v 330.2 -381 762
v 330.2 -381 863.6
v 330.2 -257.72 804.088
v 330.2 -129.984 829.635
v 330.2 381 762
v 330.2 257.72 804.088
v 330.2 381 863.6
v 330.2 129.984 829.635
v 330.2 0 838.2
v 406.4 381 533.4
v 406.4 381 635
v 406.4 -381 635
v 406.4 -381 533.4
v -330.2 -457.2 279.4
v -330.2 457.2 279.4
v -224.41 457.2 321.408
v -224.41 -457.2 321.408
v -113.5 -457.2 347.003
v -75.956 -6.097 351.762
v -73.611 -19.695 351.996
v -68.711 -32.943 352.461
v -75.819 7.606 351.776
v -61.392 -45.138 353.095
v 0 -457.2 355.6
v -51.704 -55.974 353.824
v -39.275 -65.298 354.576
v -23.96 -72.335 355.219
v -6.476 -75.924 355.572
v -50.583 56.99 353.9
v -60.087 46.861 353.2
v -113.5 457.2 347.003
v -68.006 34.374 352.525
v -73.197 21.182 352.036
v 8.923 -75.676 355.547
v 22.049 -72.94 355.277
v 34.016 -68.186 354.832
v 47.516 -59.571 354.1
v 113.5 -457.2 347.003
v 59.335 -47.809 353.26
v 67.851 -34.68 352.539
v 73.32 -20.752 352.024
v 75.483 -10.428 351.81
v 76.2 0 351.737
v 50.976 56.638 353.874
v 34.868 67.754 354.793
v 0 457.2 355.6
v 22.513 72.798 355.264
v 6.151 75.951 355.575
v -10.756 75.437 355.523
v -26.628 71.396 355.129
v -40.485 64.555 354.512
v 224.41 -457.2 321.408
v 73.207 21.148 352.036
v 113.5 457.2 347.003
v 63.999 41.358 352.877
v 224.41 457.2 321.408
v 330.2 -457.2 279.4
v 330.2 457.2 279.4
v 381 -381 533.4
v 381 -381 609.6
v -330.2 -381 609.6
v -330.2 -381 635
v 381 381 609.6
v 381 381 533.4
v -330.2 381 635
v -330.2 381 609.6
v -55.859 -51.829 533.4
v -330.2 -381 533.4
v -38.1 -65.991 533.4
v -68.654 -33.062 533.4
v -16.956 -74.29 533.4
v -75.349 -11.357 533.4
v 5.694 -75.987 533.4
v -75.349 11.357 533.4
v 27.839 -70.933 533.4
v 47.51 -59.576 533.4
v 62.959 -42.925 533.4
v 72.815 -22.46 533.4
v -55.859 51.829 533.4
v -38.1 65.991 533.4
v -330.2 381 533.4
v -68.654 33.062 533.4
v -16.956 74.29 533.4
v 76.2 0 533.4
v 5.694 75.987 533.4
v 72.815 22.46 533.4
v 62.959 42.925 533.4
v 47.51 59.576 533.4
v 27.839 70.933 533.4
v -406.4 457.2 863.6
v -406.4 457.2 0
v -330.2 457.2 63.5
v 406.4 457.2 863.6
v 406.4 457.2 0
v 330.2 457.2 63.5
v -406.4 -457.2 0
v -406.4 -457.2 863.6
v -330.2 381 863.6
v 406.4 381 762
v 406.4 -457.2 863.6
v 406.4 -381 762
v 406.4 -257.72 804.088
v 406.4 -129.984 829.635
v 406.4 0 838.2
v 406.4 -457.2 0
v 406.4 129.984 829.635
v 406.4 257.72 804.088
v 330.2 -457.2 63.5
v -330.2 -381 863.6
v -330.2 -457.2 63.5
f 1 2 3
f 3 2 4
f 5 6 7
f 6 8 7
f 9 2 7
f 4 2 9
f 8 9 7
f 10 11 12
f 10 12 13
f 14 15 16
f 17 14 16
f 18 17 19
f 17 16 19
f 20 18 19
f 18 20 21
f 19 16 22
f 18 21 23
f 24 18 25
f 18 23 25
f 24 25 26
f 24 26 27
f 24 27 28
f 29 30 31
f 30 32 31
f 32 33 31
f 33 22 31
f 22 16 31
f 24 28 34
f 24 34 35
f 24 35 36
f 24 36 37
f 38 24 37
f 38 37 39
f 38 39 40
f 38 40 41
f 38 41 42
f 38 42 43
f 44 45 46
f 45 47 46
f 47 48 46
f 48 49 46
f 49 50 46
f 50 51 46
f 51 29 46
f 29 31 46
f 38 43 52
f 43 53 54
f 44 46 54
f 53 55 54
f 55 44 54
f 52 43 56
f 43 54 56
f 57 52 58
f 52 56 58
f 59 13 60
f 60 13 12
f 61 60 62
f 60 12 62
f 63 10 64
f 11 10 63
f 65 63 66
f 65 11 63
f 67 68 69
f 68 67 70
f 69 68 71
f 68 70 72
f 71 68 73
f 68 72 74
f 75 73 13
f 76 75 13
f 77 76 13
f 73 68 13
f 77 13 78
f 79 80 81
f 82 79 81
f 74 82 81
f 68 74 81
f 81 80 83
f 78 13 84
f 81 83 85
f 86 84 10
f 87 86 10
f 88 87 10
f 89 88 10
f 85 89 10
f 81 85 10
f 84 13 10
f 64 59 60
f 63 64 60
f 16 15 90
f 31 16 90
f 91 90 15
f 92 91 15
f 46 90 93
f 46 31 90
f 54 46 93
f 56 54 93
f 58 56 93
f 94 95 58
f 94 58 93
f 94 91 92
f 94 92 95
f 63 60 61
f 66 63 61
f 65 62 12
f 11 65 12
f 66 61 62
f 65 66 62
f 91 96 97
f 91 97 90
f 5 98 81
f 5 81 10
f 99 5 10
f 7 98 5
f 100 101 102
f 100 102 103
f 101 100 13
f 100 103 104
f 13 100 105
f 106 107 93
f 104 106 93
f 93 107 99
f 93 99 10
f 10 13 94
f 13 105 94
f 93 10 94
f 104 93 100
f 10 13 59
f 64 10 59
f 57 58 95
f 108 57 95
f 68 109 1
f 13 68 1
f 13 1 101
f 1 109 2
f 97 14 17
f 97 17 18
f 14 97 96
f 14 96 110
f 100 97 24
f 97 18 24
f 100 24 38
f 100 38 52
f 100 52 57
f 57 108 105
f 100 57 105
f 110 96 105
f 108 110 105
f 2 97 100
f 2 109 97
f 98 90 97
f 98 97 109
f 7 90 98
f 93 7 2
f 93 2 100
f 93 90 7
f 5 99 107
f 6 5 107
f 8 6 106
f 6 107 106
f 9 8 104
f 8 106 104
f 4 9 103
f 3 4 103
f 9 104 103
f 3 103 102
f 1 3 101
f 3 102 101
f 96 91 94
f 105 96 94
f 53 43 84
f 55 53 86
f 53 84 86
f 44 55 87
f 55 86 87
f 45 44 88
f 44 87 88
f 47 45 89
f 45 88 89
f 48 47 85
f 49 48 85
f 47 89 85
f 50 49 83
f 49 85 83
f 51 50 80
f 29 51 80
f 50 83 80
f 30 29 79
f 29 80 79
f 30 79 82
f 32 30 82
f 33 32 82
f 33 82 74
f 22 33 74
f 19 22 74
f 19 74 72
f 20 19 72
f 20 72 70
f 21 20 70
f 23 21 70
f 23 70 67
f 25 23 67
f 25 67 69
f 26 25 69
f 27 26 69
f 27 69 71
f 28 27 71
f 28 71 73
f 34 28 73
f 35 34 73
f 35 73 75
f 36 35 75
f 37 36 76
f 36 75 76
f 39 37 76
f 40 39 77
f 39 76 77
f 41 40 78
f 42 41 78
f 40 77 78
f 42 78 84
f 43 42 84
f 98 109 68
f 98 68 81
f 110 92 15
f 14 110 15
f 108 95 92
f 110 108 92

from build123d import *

# Parameters (mm, degrees)
F0_W      = 812.8
F0_H      = 914.4
F1_DEPTH  = 863.6
F3_DEPTH  = 736.6
F4_W      = 660.4
F4_H      = 762
F5_DEPTH  = 101.601
F7_DEPTH  = 914.401
F8_R      = 76.2
F9_DEPTH  = 181.6637094627
F10_W     = 25.4
F10_H     = 76.2
F11_DEPTH = 762


with BuildPart() as f1:
    # F0 (on Top) → F1 (new body)
    with BuildSketch(Plane.XY):
        Rectangle(F0_W, F0_H)
    extrude(amount=F1_DEPTH)

    # F2 (on face) → F3 (cut)
    with BuildSketch(Plane.YZ.offset(406.4)):
        with BuildLine():
            Line((-381, 762), (-381, 533.4))
            Line((-381, 533.4), (381, 533.4))
            Line((381, 533.4), (381, 762))
            ThreePointArc((381, 762), (0, 838.2), (-381, 762))
        make_face()
    extrude(amount=-F3_DEPTH, mode=Mode.SUBTRACT)

    # F4 (on face) → F5 (cut, through all)
    with BuildSketch(Plane.XY.offset(863.6)):
        Rectangle(F4_W, F4_H)
    extrude(amount=-F5_DEPTH, mode=Mode.SUBTRACT)

    # F6 (on face) → F7 (cut, through all)
    with BuildSketch(Plane(origin=(0, 457.2, 0), x_dir=(-1, 0, 0), z_dir=(0, 1, 0))):
        with BuildLine():
            Line((-330.2, 279.4), (-330.2, 63.5))
            Line((-330.2, 63.5), (330.2, 63.5))
            Line((330.2, 63.5), (330.2, 279.4))
            ThreePointArc((330.2, 279.4), (169.4391323628, 336.3029126179), (-2.5689e-06, 355.6))
            ThreePointArc((-2.5689e-06, 355.6), (-169.439134866, 336.3029120403), (-330.2, 279.4))
        make_face()
    extrude(amount=-F7_DEPTH, mode=Mode.SUBTRACT)

    # F8 (on face) → F9 (cut, through all)
    with BuildSketch(Plane.XY.offset(533.4)):
        Circle(F8_R)
    extrude(amount=-F9_DEPTH, mode=Mode.SUBTRACT)


with BuildPart() as f11:
    # F10 (on face) → F11 (new body, through all)
    with BuildSketch(Plane(origin=(0, -381, 0), x_dir=(-1, 0, 0), z_dir=(0, 1, 0))):
        Polygon((-406.4, 635), (-406.4, 609.6), (-381, 609.6), (330.2, 609.6), (330.2, 635), align=None)
        with Locations((-393.7, 571.5)):
            Rectangle(F10_W, F10_H)
    extrude(amount=F11_DEPTH)


solid = Compound([f1.part, f11.part])
